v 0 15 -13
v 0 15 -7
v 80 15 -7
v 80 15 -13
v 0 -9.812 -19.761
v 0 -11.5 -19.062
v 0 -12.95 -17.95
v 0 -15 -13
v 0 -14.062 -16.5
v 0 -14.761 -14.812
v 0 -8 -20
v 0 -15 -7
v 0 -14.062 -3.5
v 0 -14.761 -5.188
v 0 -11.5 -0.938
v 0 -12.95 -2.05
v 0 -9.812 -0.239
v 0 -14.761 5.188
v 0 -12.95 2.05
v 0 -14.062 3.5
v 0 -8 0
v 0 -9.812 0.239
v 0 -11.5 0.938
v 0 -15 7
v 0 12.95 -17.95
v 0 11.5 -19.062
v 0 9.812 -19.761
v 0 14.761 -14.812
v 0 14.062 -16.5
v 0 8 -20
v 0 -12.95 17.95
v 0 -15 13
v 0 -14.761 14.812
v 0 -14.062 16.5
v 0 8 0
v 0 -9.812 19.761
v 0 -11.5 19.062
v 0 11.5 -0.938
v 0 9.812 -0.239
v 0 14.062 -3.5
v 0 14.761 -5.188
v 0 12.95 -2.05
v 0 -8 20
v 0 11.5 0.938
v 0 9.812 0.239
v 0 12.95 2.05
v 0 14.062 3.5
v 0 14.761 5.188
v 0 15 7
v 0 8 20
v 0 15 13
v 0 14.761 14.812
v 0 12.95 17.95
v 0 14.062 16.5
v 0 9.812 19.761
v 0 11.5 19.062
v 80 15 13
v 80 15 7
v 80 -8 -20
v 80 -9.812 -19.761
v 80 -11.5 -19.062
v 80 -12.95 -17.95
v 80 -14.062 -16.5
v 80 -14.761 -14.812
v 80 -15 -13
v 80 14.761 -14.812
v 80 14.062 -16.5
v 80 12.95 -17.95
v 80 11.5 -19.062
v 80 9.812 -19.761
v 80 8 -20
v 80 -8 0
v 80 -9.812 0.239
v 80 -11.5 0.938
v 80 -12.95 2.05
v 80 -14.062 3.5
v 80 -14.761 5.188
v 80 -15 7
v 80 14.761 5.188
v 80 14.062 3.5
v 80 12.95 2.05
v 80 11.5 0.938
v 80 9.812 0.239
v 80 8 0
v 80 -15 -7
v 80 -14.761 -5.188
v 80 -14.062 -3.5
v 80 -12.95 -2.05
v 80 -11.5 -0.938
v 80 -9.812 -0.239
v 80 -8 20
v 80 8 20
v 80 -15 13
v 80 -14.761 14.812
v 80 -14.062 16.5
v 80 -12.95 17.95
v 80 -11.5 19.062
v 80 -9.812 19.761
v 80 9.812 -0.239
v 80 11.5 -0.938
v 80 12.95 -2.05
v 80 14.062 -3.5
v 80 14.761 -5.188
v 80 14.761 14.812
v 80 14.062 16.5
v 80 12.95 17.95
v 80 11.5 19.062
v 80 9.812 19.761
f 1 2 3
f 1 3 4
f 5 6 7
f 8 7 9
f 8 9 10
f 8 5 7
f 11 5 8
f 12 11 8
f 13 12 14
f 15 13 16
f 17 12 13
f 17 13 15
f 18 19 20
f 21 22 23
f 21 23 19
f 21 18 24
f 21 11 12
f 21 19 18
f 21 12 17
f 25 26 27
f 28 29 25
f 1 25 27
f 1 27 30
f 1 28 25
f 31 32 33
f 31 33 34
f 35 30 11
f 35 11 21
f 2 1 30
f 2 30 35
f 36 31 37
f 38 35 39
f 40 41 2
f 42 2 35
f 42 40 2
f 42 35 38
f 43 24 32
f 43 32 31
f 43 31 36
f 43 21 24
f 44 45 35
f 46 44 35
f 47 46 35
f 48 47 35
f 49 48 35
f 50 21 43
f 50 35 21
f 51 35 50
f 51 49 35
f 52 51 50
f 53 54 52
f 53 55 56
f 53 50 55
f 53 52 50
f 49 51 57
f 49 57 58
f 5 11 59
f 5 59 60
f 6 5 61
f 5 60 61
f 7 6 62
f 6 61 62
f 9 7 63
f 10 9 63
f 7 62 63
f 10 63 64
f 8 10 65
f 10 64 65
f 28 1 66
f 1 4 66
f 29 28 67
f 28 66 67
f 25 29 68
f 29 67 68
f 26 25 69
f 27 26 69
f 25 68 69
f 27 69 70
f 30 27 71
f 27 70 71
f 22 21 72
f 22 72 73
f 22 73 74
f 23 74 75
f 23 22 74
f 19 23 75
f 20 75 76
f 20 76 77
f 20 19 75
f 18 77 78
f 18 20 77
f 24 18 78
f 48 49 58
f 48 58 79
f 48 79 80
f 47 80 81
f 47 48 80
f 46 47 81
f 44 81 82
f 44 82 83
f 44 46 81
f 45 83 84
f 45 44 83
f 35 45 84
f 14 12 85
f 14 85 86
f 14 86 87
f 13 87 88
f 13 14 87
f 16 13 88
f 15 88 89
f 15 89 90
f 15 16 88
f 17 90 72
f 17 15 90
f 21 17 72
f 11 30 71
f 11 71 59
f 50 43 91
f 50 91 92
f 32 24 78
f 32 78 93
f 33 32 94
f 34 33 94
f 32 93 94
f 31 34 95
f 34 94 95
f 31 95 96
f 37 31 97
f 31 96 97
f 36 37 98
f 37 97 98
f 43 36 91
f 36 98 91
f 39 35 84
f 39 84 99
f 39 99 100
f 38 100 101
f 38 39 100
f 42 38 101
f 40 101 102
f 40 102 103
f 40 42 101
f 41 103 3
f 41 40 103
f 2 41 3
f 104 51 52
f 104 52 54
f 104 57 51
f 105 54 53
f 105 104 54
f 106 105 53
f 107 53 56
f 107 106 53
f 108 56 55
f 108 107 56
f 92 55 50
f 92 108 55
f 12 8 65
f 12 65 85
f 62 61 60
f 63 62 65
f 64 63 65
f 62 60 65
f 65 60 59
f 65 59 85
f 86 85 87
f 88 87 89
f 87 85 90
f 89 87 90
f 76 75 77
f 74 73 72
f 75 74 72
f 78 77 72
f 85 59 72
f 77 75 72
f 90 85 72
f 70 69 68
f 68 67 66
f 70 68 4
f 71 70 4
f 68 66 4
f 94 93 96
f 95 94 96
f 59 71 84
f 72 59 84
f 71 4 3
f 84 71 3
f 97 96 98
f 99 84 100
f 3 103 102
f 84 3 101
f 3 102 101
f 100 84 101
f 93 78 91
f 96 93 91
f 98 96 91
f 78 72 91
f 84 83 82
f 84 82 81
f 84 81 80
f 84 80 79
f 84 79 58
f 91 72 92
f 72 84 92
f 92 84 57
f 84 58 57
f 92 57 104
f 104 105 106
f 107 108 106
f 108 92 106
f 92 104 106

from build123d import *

# Parameters (mm, degrees)
EXTRUDE_1_DEPTH = 80
FILLET_1_R      = 7
FILLET_2_R      = 7
FILLET_3_R      = 7
FILLET_4_R      = 7


with BuildPart() as part:
    # 草图1 → 凸台-拉伸1 (new body)
    with BuildSketch(Plane(origin=(0, 0, 0), x_dir=(0, 0, -1), z_dir=(1, 0, 0))):
        with BuildLine():
            Line((20, -15), (7, -15))
            ThreePointArc((7, -15), (2.050252532, -12.949747468), (0, -8))
            ThreePointArc((0, -8), (-2.050252532, -12.949747468), (-7, -15))
            Line((-7, -15), (-20, -15))
            Line((-20, -15), (-20, 15))
            Line((-20, 15), (-7, 15))
            ThreePointArc((-7, 15), (-2.050252532, 12.949747468), (0, 8))
            ThreePointArc((0, 8), (2.050252532, 12.949747468), (7, 15))
            Line((7, 15), (20, 15))
            Line((20, 15), (20, -15))
        make_face()
    extrude(amount=EXTRUDE_1_DEPTH)

    # 圆角1
    fillet_1_edges = [part.edges().sort_by_distance(p)[0] for p in [
        (40, 15, -20),
    ]]
    fillet(fillet_1_edges, radius=FILLET_1_R)

    # 圆角2
    fillet_2_edges = [part.edges().sort_by_distance(p)[0] for p in [
        (40, 15, 20),
    ]]
    fillet(fillet_2_edges, radius=FILLET_2_R)

    # 圆角3
    fillet_3_edges = [part.edges().sort_by_distance(p)[0] for p in [
        (40, -15, -20),
    ]]
    fillet(fillet_3_edges, radius=FILLET_3_R)

    # 圆角4
    fillet_4_edges = [part.edges().sort_by_distance(p)[0] for p in [
        (40, -15, 20),
    ]]
    fillet(fillet_4_edges, radius=FILLET_4_R)


solid = part.part
